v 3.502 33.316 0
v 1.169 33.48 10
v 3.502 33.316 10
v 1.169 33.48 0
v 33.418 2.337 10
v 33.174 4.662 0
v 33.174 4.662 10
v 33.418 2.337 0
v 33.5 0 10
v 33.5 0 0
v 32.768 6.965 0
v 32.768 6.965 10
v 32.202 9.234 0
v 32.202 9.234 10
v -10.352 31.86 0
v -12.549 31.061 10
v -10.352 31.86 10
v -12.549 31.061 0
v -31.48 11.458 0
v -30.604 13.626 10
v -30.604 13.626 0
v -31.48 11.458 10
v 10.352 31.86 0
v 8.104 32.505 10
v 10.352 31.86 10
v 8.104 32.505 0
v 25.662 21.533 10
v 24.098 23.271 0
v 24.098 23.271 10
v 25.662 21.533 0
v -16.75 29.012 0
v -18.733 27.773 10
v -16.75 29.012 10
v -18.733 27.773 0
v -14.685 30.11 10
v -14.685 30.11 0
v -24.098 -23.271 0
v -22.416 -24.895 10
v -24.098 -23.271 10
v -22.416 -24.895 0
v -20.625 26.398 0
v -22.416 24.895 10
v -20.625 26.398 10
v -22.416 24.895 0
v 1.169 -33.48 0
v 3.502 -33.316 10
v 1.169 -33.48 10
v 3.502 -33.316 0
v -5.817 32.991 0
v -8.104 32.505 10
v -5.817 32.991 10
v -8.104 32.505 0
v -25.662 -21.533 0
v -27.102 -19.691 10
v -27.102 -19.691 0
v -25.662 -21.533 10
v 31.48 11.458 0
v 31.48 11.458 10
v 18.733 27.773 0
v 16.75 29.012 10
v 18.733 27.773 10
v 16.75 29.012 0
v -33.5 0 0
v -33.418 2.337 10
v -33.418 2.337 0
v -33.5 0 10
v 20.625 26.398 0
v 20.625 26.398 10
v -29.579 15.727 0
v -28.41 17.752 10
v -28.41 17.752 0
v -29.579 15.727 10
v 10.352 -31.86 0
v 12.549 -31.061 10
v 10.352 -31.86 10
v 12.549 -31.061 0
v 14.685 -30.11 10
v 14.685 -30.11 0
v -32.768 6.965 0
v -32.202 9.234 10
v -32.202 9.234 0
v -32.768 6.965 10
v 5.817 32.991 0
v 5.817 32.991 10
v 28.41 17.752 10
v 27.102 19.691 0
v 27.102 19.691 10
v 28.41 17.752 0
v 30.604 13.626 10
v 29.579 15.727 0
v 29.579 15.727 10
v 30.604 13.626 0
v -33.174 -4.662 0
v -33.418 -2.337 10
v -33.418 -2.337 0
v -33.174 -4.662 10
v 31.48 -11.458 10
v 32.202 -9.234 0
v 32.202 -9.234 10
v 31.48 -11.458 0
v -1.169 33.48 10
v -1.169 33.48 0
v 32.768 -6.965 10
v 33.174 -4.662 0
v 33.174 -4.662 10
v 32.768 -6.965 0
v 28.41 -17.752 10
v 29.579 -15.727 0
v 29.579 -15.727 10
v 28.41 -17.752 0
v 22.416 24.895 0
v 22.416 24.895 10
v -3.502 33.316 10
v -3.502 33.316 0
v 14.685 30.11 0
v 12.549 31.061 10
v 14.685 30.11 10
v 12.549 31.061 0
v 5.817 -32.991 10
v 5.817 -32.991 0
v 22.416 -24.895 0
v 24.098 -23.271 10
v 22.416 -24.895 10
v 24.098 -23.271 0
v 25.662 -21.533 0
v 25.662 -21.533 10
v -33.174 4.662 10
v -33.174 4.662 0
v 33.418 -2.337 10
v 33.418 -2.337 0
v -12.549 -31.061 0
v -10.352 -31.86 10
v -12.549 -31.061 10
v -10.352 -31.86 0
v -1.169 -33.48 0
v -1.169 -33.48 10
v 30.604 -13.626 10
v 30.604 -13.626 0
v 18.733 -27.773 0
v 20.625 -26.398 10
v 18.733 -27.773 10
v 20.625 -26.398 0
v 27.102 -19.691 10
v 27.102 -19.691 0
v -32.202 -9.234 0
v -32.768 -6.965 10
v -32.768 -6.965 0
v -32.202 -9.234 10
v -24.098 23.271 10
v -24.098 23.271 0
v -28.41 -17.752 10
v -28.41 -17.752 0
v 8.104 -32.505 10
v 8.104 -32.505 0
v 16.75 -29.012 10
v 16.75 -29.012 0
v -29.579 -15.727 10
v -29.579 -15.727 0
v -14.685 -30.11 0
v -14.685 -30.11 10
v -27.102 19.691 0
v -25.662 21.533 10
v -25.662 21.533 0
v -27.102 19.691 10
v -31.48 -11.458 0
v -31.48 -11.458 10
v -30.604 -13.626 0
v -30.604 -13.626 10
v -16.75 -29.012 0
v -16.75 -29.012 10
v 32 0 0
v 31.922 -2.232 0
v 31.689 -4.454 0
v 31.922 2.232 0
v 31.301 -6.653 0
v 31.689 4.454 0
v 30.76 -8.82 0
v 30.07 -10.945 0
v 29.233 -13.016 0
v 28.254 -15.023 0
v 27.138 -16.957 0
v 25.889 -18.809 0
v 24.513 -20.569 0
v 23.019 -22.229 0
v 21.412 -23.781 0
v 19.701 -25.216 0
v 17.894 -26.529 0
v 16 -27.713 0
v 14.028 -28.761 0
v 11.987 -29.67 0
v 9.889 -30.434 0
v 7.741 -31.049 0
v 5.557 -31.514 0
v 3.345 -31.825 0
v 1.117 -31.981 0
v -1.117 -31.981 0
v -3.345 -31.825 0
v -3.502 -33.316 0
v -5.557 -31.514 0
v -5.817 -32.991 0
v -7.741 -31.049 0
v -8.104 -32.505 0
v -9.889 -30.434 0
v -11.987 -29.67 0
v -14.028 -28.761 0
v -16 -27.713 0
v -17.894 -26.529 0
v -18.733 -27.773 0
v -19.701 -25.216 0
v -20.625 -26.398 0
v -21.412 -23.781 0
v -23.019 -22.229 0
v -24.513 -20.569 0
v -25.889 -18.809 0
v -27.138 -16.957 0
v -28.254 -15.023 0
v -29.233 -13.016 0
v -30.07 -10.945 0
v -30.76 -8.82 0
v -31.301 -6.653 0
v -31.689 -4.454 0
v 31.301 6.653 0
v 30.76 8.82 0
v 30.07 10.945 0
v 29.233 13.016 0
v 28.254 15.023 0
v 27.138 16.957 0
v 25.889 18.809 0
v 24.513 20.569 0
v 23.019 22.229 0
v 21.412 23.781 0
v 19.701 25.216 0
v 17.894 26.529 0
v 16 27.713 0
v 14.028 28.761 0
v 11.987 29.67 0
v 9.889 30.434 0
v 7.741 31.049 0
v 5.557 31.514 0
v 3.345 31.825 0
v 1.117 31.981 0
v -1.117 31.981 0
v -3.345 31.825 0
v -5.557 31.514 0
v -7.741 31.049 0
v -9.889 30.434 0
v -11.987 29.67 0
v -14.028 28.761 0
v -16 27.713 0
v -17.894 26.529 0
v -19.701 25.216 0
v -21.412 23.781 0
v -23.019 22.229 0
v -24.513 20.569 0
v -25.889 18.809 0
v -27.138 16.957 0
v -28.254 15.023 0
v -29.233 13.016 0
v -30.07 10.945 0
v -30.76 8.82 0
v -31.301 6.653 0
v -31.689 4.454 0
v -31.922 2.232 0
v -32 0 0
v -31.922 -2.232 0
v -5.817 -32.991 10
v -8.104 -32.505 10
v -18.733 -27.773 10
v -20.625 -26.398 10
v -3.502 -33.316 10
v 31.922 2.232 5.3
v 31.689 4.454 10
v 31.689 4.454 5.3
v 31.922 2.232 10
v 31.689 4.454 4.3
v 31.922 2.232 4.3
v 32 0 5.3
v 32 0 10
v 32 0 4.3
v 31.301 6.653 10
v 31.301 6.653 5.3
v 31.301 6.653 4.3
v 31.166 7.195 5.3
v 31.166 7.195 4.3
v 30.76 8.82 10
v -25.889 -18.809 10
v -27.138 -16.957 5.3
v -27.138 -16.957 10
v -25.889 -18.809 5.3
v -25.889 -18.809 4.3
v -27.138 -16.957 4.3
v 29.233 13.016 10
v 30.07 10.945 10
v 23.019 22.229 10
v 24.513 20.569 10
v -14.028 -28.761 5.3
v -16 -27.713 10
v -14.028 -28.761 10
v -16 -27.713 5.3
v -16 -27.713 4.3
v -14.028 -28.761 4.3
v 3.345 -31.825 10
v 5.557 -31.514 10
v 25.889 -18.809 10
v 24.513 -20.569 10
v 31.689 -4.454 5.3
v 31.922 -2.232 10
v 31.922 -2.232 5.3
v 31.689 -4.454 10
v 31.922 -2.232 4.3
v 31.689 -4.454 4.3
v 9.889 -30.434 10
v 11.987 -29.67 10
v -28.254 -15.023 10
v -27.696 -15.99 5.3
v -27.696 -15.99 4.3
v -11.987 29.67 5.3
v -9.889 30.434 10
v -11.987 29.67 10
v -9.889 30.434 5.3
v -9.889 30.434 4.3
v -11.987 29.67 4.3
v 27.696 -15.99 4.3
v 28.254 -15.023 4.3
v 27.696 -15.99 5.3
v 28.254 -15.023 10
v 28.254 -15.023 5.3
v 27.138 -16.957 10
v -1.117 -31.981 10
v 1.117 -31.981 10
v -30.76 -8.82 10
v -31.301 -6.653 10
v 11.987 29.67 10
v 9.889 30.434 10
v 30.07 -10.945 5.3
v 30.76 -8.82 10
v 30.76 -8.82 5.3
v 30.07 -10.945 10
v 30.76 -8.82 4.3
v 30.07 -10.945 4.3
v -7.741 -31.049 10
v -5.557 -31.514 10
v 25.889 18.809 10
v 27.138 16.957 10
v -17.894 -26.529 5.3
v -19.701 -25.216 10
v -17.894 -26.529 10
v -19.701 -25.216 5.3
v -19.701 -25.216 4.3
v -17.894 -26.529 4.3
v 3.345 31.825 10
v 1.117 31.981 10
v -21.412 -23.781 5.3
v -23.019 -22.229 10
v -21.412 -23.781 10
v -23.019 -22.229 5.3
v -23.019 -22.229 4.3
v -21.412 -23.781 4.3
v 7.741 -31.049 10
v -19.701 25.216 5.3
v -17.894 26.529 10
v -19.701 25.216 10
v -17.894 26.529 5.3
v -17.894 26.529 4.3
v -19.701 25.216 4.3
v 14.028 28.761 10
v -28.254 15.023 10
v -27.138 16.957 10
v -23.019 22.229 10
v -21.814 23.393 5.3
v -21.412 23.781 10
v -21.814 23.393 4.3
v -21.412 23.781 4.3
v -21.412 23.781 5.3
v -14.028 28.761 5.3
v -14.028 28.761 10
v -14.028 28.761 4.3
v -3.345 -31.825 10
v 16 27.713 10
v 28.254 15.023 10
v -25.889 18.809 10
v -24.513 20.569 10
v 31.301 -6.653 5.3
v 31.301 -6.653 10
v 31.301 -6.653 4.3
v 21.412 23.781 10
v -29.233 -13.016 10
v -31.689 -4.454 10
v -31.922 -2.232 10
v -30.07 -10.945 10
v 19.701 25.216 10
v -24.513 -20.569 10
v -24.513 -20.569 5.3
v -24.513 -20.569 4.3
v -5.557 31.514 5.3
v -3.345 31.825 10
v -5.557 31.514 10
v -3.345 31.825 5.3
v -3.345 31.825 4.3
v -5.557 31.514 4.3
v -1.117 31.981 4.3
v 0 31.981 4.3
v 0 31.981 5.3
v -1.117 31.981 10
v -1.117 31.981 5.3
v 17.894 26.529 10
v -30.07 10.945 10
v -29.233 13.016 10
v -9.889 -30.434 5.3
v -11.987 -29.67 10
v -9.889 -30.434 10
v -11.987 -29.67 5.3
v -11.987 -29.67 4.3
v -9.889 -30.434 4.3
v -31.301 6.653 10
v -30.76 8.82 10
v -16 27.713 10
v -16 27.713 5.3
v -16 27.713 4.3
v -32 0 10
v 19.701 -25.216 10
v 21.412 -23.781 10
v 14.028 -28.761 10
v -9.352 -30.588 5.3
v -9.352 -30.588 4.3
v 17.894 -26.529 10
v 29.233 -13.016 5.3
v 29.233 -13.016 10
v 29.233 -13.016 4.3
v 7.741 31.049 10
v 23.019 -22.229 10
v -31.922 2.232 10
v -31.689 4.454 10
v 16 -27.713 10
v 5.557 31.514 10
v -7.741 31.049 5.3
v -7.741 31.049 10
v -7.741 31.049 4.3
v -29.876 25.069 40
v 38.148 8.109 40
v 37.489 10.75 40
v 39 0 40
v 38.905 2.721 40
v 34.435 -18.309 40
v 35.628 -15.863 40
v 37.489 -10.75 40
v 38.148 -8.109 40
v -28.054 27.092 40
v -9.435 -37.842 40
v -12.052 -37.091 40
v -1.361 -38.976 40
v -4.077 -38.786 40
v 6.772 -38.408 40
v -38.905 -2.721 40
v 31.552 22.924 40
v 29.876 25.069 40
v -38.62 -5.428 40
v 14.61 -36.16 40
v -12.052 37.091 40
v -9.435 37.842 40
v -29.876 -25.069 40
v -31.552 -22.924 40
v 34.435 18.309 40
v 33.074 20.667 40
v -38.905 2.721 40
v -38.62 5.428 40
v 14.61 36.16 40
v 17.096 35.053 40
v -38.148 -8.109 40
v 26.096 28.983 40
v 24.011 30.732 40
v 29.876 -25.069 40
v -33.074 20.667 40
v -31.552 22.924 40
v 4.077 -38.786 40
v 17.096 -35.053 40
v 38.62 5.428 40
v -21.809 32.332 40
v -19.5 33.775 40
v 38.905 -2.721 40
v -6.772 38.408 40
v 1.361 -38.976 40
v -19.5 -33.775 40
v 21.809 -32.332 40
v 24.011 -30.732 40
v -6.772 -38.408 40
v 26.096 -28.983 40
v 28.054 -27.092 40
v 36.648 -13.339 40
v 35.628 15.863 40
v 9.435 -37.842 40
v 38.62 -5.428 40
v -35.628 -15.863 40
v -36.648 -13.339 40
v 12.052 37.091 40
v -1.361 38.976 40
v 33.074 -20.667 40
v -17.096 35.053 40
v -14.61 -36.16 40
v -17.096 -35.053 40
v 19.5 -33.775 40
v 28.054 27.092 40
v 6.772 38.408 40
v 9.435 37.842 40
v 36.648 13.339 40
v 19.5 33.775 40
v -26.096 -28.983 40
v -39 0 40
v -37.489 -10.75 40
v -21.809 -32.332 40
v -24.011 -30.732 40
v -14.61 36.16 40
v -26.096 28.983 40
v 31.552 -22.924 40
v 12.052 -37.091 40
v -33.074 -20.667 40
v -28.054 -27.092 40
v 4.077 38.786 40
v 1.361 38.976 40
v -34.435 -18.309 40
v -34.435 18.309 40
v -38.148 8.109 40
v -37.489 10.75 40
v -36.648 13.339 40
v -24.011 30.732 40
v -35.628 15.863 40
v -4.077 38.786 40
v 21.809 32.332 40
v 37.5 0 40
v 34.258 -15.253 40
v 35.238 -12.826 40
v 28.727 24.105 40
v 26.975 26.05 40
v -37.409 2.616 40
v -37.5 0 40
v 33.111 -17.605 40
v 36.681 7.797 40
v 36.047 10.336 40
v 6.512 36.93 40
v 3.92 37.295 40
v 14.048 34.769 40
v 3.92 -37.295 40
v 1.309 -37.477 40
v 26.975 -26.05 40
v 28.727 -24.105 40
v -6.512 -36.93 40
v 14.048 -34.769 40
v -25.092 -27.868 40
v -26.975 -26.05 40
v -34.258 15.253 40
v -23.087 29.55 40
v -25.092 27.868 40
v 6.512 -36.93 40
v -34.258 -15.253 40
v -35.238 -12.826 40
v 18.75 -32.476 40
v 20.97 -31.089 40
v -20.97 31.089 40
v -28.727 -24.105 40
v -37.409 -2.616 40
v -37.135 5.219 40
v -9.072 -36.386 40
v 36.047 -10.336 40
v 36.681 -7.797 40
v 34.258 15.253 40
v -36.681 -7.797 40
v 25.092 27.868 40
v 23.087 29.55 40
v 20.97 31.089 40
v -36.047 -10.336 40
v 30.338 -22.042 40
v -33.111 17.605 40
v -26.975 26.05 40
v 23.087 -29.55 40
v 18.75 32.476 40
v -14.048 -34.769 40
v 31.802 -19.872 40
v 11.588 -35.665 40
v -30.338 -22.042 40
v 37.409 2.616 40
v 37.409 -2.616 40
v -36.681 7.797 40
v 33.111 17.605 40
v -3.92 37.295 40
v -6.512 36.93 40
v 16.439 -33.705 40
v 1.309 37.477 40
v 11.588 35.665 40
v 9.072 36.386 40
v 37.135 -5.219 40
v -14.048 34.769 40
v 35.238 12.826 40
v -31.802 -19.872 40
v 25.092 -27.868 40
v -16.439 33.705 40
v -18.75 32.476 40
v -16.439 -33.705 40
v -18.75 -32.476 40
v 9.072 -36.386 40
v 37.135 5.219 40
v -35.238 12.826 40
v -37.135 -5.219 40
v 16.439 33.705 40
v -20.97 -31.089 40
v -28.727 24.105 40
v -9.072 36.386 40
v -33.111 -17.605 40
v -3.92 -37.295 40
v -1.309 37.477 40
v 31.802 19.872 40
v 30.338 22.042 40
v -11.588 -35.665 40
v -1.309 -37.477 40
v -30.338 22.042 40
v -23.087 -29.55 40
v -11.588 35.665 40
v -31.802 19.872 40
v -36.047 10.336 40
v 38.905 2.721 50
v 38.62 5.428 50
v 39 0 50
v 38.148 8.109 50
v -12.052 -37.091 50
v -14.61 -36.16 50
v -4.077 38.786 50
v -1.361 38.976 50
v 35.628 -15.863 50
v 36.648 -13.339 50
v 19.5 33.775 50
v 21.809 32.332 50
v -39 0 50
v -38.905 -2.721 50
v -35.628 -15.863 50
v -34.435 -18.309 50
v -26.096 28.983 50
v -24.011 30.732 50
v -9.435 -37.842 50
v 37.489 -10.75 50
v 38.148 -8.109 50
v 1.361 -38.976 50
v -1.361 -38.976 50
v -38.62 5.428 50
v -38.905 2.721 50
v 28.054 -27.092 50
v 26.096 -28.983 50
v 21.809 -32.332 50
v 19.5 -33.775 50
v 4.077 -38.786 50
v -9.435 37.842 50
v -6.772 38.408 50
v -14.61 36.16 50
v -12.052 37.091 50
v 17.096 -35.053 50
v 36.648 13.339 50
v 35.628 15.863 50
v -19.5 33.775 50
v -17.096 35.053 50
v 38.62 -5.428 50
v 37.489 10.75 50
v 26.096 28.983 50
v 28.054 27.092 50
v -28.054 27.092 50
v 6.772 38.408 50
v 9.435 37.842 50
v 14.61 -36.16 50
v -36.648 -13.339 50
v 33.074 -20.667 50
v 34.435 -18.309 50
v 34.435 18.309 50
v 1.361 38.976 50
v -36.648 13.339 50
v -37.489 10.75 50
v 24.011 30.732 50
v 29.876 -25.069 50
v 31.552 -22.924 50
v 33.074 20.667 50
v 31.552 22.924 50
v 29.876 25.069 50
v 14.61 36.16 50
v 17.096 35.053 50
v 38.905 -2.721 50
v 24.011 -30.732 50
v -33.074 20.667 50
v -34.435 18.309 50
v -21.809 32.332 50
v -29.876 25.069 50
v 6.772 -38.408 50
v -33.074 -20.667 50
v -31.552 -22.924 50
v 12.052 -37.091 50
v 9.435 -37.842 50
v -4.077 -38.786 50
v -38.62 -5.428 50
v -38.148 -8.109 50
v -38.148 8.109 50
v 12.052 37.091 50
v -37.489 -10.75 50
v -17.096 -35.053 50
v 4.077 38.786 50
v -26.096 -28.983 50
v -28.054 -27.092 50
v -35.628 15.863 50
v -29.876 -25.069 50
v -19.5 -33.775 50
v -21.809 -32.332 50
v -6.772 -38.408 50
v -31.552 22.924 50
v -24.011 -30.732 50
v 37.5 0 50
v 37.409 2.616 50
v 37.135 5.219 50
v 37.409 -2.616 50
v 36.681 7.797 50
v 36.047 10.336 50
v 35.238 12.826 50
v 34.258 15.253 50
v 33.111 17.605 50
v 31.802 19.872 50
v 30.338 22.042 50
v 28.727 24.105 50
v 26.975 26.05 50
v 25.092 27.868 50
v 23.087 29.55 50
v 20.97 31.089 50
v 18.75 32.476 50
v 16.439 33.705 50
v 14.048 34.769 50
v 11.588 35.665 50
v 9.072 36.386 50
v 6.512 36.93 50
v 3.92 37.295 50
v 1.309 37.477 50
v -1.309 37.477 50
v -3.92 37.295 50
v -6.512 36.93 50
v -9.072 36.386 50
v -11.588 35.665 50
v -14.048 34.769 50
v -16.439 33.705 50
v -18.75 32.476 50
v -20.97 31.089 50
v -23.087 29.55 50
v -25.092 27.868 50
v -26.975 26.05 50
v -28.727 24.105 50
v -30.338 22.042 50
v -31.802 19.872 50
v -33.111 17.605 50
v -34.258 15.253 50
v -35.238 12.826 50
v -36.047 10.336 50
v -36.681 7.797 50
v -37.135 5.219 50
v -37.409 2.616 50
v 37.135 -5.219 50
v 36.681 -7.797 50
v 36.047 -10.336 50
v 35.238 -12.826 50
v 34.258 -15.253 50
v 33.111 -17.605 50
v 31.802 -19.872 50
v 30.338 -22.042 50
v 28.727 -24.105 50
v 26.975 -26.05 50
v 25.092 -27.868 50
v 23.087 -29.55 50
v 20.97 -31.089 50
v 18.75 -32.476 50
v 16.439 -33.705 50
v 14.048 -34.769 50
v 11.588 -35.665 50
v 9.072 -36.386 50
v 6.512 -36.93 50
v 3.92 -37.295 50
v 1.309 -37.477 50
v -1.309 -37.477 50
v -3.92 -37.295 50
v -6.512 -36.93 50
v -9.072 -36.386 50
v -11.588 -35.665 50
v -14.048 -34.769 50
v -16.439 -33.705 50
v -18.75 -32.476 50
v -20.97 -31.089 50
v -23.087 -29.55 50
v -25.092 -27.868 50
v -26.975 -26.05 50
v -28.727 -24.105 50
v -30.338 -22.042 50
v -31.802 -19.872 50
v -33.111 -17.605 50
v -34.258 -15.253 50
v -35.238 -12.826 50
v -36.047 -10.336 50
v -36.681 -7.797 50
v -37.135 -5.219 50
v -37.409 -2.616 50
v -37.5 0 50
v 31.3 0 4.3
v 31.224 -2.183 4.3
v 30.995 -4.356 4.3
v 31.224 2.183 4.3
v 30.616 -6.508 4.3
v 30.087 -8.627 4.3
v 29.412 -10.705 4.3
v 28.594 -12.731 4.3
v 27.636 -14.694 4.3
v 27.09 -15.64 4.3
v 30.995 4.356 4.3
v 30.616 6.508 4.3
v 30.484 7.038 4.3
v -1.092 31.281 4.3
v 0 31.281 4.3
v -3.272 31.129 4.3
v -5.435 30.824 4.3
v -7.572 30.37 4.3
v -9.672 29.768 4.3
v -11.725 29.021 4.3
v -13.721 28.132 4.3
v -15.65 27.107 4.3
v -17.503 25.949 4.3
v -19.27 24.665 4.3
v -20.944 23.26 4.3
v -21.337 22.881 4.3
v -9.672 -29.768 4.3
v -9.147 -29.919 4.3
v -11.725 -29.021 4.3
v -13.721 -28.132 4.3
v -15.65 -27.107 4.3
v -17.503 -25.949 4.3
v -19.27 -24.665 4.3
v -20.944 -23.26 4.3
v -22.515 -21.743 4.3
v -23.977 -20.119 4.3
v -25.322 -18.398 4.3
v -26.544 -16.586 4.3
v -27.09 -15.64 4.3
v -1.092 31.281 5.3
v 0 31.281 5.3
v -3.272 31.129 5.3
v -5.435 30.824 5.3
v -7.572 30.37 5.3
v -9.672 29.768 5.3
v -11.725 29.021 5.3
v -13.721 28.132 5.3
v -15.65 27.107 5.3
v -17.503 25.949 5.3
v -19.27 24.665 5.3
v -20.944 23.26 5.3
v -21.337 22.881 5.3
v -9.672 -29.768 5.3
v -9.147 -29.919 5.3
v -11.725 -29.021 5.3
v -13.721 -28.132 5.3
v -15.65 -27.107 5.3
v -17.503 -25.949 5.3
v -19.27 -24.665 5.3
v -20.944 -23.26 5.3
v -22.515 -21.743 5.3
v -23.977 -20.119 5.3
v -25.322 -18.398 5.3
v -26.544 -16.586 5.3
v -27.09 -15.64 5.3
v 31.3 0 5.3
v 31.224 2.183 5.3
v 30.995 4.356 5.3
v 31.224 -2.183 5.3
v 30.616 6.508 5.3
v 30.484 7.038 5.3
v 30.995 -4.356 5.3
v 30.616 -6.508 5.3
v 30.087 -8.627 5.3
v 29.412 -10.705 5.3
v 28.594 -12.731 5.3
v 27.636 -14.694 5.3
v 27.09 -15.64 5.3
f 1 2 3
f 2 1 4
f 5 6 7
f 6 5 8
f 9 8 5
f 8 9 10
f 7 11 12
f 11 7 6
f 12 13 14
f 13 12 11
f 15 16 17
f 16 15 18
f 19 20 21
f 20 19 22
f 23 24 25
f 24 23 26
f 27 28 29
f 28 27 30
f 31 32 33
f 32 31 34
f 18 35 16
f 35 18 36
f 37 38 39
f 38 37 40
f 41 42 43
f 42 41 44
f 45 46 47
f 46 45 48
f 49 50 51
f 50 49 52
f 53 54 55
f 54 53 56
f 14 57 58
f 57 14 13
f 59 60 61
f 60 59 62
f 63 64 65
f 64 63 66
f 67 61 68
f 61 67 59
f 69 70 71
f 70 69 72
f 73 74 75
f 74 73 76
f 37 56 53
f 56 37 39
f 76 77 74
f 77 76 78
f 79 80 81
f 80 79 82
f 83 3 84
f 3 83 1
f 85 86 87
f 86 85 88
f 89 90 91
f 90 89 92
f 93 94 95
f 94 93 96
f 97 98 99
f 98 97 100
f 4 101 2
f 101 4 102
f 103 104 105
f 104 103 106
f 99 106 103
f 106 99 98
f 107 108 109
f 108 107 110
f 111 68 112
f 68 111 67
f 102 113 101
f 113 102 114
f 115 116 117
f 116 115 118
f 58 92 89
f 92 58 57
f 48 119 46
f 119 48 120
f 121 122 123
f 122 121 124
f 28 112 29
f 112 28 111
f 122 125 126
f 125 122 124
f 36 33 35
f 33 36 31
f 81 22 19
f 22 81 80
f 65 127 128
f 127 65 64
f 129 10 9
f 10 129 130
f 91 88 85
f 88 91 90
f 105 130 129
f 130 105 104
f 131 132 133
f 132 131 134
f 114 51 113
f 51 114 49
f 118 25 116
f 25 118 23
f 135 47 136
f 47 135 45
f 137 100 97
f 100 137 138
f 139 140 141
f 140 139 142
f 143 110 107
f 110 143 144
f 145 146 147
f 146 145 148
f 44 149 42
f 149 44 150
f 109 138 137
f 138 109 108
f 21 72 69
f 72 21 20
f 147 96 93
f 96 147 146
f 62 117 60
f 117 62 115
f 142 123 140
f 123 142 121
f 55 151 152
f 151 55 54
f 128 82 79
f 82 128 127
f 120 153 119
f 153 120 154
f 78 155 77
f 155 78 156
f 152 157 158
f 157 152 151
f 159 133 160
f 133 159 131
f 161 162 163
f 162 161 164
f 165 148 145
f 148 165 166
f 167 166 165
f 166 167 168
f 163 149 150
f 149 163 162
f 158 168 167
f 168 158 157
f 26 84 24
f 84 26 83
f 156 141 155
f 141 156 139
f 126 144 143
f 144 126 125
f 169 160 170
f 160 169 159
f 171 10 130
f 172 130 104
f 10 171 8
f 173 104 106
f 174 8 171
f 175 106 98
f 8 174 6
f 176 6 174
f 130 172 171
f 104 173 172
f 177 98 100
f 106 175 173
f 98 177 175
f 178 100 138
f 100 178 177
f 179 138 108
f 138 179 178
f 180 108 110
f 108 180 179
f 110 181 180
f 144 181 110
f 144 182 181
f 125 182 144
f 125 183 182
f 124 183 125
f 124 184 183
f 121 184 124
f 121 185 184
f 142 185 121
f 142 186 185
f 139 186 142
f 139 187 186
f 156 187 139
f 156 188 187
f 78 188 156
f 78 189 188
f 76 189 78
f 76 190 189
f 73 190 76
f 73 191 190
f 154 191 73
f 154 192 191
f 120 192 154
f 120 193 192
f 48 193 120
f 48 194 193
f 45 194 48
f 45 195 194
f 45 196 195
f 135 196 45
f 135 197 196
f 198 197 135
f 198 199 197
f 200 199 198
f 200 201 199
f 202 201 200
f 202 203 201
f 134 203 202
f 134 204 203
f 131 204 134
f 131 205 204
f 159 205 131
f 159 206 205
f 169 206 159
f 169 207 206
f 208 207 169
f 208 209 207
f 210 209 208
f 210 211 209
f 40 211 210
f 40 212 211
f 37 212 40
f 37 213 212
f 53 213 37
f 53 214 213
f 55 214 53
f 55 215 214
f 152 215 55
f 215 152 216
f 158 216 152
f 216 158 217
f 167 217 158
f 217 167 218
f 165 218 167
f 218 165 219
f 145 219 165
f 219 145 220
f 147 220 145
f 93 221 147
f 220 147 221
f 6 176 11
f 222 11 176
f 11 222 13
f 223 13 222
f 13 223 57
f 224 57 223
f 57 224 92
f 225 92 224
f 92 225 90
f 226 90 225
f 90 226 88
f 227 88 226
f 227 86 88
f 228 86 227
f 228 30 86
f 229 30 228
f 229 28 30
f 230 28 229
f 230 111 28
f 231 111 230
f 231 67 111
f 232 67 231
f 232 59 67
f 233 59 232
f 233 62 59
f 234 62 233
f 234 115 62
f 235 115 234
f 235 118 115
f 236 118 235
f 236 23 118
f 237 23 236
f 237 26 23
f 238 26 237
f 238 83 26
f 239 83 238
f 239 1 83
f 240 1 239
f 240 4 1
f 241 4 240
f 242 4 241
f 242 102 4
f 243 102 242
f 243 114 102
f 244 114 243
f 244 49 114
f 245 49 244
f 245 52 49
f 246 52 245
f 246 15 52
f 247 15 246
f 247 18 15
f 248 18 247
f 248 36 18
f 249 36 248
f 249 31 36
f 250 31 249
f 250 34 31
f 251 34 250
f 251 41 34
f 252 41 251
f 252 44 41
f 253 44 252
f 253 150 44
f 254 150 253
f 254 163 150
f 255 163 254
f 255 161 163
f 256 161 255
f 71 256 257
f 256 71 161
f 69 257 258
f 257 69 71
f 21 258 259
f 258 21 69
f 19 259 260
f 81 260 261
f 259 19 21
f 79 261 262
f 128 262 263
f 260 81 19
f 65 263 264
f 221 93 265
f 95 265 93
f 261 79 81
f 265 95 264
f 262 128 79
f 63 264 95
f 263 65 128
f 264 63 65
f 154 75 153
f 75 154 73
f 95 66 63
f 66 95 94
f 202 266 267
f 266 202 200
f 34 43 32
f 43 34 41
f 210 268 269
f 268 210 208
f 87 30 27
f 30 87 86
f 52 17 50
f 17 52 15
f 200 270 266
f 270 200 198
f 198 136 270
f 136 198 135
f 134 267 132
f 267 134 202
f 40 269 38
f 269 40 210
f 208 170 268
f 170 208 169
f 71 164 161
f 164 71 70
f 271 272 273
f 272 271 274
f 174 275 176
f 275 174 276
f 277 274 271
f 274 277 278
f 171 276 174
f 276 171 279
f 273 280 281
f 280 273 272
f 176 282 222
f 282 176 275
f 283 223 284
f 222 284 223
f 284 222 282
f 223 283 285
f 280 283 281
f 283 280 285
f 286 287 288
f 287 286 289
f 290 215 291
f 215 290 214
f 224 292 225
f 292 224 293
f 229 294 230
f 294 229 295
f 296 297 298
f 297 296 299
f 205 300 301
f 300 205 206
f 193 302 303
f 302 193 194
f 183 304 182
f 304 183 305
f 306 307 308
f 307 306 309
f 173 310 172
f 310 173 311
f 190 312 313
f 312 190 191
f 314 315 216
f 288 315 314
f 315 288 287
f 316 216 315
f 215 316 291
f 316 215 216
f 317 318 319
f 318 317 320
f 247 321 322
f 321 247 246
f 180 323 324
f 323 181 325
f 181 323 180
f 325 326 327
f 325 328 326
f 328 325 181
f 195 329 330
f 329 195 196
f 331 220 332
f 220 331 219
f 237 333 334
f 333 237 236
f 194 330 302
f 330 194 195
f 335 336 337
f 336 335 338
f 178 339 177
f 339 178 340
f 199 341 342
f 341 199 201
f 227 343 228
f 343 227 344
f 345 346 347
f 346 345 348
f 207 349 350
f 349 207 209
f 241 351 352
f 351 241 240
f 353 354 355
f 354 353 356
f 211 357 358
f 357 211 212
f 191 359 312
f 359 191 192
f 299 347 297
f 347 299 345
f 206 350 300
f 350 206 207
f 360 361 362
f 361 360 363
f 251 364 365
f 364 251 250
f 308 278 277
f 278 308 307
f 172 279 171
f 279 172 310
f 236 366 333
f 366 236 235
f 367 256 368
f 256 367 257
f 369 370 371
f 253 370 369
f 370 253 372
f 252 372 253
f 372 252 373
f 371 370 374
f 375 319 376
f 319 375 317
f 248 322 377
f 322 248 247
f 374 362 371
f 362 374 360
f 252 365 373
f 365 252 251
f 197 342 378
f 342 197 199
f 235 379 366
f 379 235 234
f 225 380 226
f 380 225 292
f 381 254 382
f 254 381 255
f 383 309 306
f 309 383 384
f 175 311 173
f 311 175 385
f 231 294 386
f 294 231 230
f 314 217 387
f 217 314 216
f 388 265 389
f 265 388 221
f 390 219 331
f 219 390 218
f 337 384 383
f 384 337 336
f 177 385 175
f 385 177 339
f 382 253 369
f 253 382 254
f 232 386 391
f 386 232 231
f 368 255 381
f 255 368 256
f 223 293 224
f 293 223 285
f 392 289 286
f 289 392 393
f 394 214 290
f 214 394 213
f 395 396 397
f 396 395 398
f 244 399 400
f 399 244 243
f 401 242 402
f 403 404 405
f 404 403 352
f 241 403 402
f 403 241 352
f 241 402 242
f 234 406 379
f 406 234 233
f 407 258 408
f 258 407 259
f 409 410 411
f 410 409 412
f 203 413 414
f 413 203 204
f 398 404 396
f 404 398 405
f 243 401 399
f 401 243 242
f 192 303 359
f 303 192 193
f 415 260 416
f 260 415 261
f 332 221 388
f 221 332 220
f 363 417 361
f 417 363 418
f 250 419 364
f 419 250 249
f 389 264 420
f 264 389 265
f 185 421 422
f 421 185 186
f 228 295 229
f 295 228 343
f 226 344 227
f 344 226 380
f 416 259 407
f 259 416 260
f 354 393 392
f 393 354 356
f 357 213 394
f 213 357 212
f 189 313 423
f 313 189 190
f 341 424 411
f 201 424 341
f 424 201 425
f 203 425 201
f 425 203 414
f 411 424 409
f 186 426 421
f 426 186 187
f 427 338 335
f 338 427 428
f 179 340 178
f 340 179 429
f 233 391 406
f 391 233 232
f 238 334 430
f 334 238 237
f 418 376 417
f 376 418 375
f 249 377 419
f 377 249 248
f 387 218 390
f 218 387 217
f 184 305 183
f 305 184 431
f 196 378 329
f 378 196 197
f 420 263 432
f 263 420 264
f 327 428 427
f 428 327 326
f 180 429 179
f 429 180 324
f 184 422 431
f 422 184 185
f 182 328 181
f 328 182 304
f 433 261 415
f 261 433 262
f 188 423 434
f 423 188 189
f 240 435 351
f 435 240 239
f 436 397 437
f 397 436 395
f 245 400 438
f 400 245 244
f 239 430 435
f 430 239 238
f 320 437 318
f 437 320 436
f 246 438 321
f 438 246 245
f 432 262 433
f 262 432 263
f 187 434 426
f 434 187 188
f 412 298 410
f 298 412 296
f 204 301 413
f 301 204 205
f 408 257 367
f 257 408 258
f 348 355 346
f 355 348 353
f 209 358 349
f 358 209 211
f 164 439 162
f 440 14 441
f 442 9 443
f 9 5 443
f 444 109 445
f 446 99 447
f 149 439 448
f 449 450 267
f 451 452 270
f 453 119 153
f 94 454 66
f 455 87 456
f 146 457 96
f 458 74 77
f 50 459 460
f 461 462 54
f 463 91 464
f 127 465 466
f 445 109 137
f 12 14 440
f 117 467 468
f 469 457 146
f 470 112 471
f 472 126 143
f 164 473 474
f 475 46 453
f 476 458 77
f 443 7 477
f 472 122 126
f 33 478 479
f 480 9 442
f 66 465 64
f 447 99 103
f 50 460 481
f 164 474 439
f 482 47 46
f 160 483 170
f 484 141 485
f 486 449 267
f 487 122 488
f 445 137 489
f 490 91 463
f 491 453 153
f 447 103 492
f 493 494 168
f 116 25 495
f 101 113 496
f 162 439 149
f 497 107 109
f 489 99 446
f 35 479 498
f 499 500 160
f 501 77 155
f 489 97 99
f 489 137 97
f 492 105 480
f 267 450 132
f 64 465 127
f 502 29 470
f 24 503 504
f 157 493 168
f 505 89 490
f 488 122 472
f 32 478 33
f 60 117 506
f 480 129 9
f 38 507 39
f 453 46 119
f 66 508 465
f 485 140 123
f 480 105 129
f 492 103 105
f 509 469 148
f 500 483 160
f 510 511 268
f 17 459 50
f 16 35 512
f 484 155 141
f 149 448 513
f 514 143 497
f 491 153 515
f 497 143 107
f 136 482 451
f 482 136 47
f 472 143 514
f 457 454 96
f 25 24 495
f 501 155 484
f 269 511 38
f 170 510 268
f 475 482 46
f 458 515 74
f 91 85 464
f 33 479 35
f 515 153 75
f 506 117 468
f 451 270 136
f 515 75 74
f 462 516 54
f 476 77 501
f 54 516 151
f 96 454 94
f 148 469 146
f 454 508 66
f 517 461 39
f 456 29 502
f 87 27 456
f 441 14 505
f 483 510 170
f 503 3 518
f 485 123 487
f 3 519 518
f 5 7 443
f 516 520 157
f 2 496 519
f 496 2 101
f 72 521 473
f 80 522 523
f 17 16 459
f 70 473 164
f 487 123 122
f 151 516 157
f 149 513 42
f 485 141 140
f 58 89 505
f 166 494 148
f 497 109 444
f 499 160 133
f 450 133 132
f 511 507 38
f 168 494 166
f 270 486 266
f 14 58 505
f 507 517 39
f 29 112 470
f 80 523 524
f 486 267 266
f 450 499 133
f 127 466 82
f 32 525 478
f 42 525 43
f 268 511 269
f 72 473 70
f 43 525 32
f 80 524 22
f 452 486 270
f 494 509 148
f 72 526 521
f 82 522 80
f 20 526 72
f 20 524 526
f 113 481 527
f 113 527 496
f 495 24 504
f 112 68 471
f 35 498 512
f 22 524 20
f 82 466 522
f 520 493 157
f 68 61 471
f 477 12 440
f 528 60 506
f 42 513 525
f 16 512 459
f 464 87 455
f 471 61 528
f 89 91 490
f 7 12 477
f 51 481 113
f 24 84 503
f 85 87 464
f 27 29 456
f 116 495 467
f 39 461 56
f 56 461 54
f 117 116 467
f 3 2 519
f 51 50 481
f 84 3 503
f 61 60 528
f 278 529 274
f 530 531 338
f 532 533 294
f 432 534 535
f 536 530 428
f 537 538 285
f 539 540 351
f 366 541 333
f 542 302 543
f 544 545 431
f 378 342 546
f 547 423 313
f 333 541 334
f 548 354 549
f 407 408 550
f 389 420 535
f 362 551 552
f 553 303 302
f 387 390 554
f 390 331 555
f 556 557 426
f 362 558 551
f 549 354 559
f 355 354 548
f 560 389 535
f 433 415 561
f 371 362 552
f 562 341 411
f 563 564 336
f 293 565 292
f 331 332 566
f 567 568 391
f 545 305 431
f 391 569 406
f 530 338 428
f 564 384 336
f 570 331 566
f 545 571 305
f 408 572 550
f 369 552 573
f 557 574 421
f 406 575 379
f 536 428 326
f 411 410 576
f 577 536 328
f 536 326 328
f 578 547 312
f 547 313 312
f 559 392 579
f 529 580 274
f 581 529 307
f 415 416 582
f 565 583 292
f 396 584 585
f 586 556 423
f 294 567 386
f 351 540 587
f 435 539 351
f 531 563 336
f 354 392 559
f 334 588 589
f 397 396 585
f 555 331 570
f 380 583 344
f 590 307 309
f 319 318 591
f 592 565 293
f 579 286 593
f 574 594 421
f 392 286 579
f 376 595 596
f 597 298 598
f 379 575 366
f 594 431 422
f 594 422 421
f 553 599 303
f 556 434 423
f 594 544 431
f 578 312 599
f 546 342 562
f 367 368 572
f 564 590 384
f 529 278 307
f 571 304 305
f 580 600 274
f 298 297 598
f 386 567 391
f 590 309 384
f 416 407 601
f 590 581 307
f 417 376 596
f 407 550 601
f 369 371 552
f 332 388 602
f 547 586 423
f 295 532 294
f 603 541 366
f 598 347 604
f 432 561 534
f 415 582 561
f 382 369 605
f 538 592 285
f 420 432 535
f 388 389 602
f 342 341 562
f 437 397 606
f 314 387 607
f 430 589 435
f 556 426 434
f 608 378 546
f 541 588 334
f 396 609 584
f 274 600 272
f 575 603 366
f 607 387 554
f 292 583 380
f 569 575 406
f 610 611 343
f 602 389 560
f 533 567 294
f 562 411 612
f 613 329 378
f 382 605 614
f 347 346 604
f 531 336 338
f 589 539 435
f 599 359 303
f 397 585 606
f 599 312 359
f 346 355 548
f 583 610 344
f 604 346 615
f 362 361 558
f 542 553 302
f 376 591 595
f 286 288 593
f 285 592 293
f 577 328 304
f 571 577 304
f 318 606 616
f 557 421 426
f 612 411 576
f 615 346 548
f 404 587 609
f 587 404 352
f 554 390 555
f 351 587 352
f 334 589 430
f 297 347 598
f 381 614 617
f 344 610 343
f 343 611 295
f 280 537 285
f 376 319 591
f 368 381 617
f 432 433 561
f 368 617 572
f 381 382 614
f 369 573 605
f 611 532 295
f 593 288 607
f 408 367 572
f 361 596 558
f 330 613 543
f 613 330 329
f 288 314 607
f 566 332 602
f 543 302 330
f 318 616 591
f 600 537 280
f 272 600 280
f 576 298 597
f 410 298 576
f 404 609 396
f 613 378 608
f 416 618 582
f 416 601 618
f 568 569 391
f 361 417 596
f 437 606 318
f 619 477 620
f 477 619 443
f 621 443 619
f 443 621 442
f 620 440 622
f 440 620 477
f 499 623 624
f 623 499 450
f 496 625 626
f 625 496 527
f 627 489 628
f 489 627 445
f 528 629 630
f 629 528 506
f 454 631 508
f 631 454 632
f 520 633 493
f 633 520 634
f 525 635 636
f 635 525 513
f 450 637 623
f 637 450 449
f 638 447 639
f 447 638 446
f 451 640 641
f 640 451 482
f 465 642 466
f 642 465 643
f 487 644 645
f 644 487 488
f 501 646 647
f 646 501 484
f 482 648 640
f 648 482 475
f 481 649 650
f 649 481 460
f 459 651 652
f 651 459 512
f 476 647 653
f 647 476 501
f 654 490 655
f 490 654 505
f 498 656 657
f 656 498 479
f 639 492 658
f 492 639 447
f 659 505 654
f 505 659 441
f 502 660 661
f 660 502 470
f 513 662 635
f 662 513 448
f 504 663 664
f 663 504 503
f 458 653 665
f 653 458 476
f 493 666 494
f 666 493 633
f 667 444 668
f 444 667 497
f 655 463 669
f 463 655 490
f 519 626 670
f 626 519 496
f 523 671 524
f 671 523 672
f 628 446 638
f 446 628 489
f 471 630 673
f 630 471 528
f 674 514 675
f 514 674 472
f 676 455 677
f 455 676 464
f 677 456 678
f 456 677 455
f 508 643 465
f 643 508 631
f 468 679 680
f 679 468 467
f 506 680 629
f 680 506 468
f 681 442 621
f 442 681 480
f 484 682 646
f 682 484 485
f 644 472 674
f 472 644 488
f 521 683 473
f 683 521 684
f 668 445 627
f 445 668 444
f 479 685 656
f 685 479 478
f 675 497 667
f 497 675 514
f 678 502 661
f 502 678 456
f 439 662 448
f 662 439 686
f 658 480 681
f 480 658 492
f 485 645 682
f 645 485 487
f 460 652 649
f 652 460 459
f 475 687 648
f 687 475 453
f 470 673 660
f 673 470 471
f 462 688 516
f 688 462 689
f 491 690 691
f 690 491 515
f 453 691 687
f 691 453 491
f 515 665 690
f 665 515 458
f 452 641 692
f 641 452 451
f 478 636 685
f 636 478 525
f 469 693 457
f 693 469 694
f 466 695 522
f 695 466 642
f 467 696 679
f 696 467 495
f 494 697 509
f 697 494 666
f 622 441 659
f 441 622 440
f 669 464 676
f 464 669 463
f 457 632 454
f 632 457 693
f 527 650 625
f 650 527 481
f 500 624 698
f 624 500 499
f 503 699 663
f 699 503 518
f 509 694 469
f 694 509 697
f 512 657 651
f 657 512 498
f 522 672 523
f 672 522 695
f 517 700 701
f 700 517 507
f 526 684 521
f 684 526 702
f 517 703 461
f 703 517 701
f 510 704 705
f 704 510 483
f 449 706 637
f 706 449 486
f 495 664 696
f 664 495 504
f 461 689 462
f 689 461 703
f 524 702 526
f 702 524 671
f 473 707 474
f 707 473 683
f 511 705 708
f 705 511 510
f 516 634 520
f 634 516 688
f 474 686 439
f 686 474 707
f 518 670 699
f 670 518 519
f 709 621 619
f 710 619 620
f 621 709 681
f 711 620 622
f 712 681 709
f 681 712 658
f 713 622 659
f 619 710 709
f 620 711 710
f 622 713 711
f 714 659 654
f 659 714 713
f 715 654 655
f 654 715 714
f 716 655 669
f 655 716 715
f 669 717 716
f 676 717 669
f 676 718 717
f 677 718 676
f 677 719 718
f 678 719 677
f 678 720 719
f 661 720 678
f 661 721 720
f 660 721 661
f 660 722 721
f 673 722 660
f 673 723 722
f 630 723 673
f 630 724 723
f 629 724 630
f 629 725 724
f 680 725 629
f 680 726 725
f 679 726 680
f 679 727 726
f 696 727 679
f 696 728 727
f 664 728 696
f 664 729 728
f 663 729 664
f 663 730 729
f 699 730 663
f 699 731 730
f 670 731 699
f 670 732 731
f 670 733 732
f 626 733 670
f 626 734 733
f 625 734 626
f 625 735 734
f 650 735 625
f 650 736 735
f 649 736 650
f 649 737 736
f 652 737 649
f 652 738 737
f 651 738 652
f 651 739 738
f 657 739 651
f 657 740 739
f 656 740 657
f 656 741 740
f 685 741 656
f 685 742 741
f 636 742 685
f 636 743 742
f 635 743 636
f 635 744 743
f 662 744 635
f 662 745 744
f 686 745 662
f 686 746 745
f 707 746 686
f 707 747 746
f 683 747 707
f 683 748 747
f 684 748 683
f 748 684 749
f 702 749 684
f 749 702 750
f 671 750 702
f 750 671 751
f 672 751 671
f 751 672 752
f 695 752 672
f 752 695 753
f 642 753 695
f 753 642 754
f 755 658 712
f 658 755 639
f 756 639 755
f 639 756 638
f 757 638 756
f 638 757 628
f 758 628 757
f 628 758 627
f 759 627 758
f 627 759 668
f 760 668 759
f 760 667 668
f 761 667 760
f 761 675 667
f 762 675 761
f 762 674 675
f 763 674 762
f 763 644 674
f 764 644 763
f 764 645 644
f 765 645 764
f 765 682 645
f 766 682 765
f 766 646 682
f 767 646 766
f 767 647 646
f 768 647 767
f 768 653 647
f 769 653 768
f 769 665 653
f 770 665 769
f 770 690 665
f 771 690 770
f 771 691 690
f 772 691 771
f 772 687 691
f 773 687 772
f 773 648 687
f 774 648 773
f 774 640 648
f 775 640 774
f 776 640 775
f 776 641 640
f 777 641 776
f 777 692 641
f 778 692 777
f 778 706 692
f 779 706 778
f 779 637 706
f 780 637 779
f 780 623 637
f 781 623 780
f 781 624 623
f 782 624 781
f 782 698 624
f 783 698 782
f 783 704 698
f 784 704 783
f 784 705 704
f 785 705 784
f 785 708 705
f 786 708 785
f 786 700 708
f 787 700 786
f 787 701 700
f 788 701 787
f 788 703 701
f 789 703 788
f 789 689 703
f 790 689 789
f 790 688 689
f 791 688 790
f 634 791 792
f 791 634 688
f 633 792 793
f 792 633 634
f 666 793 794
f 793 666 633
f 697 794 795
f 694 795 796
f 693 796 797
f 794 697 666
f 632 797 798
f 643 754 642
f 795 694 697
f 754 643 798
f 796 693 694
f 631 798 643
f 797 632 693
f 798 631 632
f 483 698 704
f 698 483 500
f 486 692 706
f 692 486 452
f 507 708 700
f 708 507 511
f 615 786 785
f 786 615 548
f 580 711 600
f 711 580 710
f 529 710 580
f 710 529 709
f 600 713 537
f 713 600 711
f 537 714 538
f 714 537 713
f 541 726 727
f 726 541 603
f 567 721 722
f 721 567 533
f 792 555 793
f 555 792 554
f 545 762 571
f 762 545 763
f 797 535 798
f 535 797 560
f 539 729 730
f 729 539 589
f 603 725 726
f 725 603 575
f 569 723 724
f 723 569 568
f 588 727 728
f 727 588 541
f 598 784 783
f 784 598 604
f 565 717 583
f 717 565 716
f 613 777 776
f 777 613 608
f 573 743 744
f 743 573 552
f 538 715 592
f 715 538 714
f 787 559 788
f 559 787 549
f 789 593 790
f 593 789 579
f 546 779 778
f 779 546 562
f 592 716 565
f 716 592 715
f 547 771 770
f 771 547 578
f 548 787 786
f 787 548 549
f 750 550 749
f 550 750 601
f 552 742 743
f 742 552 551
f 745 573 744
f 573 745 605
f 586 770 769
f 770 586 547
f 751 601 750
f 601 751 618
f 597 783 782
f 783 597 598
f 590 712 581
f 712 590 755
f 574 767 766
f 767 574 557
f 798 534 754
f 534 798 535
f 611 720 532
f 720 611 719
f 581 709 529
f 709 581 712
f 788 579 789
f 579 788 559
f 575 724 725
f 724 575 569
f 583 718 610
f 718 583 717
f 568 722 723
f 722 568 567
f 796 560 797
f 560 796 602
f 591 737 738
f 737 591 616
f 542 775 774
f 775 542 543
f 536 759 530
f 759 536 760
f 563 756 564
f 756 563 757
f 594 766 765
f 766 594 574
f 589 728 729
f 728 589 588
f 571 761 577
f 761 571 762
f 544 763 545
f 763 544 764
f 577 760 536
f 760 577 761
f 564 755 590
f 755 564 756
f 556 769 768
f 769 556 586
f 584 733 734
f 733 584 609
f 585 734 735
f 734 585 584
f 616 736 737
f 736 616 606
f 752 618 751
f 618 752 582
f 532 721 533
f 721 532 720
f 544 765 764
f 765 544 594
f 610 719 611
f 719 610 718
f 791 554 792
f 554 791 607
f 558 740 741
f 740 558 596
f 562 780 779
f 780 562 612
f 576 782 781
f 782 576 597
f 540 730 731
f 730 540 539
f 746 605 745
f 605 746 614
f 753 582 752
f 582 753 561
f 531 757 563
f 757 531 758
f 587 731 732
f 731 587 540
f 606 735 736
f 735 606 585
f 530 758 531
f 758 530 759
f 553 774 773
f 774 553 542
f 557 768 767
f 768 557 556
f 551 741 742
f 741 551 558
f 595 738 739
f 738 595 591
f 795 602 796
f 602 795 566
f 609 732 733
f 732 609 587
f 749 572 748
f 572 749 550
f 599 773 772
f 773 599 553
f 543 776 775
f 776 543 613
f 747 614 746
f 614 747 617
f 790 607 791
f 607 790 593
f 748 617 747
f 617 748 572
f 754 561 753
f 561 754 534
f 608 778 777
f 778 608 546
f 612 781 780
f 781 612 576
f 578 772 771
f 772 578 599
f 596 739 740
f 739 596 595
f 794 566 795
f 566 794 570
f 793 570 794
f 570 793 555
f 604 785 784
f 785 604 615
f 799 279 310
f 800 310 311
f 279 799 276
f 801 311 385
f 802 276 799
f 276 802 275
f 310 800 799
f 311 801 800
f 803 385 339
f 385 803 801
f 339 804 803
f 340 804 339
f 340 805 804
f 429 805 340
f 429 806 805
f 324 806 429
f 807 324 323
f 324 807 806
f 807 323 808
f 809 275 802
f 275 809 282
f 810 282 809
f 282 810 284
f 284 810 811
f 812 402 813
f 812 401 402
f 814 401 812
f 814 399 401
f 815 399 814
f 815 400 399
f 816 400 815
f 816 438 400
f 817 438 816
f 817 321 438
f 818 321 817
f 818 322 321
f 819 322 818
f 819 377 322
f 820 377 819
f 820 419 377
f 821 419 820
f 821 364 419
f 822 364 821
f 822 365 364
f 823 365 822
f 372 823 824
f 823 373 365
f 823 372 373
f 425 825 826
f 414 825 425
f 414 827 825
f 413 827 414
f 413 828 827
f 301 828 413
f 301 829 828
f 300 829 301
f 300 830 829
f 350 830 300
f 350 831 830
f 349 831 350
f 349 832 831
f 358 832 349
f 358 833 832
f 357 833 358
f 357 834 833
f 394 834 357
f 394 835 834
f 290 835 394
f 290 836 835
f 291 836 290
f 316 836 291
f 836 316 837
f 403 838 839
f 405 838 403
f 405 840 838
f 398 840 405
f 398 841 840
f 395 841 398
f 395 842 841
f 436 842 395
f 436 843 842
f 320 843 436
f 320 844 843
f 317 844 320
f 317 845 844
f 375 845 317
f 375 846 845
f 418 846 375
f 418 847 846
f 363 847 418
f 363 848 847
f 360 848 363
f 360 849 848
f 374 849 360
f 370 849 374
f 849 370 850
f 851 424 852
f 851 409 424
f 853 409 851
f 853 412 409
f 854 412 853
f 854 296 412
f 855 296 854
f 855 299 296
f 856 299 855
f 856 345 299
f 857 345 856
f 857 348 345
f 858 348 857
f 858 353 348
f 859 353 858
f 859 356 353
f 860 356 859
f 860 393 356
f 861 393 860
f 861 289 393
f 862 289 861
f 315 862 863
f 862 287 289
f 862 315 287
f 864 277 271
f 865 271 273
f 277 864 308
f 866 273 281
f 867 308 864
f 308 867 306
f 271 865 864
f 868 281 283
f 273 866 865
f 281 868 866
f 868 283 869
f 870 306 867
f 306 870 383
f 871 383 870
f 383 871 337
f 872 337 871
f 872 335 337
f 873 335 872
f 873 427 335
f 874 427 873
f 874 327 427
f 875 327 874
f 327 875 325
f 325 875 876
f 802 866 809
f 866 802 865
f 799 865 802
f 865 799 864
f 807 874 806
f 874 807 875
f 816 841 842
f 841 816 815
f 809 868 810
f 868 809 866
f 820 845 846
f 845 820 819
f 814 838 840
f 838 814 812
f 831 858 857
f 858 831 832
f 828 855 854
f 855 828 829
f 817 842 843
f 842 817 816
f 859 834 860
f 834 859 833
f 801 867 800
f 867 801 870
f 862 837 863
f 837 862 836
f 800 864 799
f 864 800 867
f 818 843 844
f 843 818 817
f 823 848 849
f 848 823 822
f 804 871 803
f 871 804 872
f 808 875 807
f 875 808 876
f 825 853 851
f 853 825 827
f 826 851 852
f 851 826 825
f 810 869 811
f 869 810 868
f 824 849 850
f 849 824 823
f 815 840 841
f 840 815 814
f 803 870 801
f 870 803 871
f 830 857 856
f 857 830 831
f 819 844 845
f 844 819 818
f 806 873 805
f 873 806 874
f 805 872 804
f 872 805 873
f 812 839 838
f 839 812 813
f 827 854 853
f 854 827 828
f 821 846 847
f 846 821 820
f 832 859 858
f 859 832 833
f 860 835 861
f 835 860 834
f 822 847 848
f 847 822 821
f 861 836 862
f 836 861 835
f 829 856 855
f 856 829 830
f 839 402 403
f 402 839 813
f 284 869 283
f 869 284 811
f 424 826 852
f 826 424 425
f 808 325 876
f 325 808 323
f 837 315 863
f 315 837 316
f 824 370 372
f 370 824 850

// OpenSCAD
//Parameterised olympus bayonet lens hood generator
// Glyn Cowles Feb 2014


//Thickness of tube walls 
thickness=1.5; 
//Inside diameter of bottom tube 
d1_inside=64;   
//Height of bottom tube 
h1=10;   
//Inside diameter of top tube
d2_inside=75;   
//Height of top tube
h2=10;   
//Height of connector section
c_ht=30; 
// Percentage of circumference for one flange
f_pcent=12;
// Flange thickness
f_th=.7;
//Flange height
f_ht=1;
// Resolution
$fn=90;

d1=d1_inside+2*thickness;
d2=d2_inside+2*thickness;
mask_degree=ceil(120-(f_pcent/100*360)); // this is the angle of the pie_slice mask
assemble(); 
//-----------------------------------------------------------------------
module tube(d,h,t) { // diameter height thickness
rad=d/2;
difference() {
cylinder(h=h,r=rad);
cylinder(h=h,r=rad-t);
}
}
//-----------------------------------------------------------------------

module connector(){
difference() {
 cylinder (h=c_ht,r1=d1/2,r2=d2/2);
 cylinder (h=c_ht,r1=d1/2-thickness,r2=d2/2-thickness);
}
}
//-----------------------------------------------------------------------

module flange() { // the three connecting lugs at the base
  difference() {
  tube(d1-thickness*2,f_ht,f_th);
  union () { 	
  		pie_slice(0,mask_degree,d1,f_ht)  ; //65 deg is the amount to remove
  		pie_slice(120,mask_degree,d1,f_ht)  ;
  		pie_slice(240,mask_degree,d1,f_ht)  ;
	}
  }
}
//-----------------------------------------------------------------------

module pie_slice(a,b,rad,h) { // make a pie slice starting at angle a continuing for angle b with radius of rad and height of h
	x1=sin(a)*rad;
	y1=cos(a)*rad;
	x2=sin(a+b)*rad;
	y2=cos(a+b)*rad;
	linear_extrude(height=h) 
	polygon(
		points=[ [0,0],[x1,y1],[x2,y2]]
	); 
}
//-----------------------------------------------------------------------

module assemble() {
union() {
	tube(d1,h1,thickness); //bottom tube
	translate([0,0,h1]) connector();  // connector
	translate([0,0,h1+c_ht])  tube(d2,h2,thickness); // top tube
	translate([0,0,h1/2-f_th]) flange(); //connecting lugs
	}
};
